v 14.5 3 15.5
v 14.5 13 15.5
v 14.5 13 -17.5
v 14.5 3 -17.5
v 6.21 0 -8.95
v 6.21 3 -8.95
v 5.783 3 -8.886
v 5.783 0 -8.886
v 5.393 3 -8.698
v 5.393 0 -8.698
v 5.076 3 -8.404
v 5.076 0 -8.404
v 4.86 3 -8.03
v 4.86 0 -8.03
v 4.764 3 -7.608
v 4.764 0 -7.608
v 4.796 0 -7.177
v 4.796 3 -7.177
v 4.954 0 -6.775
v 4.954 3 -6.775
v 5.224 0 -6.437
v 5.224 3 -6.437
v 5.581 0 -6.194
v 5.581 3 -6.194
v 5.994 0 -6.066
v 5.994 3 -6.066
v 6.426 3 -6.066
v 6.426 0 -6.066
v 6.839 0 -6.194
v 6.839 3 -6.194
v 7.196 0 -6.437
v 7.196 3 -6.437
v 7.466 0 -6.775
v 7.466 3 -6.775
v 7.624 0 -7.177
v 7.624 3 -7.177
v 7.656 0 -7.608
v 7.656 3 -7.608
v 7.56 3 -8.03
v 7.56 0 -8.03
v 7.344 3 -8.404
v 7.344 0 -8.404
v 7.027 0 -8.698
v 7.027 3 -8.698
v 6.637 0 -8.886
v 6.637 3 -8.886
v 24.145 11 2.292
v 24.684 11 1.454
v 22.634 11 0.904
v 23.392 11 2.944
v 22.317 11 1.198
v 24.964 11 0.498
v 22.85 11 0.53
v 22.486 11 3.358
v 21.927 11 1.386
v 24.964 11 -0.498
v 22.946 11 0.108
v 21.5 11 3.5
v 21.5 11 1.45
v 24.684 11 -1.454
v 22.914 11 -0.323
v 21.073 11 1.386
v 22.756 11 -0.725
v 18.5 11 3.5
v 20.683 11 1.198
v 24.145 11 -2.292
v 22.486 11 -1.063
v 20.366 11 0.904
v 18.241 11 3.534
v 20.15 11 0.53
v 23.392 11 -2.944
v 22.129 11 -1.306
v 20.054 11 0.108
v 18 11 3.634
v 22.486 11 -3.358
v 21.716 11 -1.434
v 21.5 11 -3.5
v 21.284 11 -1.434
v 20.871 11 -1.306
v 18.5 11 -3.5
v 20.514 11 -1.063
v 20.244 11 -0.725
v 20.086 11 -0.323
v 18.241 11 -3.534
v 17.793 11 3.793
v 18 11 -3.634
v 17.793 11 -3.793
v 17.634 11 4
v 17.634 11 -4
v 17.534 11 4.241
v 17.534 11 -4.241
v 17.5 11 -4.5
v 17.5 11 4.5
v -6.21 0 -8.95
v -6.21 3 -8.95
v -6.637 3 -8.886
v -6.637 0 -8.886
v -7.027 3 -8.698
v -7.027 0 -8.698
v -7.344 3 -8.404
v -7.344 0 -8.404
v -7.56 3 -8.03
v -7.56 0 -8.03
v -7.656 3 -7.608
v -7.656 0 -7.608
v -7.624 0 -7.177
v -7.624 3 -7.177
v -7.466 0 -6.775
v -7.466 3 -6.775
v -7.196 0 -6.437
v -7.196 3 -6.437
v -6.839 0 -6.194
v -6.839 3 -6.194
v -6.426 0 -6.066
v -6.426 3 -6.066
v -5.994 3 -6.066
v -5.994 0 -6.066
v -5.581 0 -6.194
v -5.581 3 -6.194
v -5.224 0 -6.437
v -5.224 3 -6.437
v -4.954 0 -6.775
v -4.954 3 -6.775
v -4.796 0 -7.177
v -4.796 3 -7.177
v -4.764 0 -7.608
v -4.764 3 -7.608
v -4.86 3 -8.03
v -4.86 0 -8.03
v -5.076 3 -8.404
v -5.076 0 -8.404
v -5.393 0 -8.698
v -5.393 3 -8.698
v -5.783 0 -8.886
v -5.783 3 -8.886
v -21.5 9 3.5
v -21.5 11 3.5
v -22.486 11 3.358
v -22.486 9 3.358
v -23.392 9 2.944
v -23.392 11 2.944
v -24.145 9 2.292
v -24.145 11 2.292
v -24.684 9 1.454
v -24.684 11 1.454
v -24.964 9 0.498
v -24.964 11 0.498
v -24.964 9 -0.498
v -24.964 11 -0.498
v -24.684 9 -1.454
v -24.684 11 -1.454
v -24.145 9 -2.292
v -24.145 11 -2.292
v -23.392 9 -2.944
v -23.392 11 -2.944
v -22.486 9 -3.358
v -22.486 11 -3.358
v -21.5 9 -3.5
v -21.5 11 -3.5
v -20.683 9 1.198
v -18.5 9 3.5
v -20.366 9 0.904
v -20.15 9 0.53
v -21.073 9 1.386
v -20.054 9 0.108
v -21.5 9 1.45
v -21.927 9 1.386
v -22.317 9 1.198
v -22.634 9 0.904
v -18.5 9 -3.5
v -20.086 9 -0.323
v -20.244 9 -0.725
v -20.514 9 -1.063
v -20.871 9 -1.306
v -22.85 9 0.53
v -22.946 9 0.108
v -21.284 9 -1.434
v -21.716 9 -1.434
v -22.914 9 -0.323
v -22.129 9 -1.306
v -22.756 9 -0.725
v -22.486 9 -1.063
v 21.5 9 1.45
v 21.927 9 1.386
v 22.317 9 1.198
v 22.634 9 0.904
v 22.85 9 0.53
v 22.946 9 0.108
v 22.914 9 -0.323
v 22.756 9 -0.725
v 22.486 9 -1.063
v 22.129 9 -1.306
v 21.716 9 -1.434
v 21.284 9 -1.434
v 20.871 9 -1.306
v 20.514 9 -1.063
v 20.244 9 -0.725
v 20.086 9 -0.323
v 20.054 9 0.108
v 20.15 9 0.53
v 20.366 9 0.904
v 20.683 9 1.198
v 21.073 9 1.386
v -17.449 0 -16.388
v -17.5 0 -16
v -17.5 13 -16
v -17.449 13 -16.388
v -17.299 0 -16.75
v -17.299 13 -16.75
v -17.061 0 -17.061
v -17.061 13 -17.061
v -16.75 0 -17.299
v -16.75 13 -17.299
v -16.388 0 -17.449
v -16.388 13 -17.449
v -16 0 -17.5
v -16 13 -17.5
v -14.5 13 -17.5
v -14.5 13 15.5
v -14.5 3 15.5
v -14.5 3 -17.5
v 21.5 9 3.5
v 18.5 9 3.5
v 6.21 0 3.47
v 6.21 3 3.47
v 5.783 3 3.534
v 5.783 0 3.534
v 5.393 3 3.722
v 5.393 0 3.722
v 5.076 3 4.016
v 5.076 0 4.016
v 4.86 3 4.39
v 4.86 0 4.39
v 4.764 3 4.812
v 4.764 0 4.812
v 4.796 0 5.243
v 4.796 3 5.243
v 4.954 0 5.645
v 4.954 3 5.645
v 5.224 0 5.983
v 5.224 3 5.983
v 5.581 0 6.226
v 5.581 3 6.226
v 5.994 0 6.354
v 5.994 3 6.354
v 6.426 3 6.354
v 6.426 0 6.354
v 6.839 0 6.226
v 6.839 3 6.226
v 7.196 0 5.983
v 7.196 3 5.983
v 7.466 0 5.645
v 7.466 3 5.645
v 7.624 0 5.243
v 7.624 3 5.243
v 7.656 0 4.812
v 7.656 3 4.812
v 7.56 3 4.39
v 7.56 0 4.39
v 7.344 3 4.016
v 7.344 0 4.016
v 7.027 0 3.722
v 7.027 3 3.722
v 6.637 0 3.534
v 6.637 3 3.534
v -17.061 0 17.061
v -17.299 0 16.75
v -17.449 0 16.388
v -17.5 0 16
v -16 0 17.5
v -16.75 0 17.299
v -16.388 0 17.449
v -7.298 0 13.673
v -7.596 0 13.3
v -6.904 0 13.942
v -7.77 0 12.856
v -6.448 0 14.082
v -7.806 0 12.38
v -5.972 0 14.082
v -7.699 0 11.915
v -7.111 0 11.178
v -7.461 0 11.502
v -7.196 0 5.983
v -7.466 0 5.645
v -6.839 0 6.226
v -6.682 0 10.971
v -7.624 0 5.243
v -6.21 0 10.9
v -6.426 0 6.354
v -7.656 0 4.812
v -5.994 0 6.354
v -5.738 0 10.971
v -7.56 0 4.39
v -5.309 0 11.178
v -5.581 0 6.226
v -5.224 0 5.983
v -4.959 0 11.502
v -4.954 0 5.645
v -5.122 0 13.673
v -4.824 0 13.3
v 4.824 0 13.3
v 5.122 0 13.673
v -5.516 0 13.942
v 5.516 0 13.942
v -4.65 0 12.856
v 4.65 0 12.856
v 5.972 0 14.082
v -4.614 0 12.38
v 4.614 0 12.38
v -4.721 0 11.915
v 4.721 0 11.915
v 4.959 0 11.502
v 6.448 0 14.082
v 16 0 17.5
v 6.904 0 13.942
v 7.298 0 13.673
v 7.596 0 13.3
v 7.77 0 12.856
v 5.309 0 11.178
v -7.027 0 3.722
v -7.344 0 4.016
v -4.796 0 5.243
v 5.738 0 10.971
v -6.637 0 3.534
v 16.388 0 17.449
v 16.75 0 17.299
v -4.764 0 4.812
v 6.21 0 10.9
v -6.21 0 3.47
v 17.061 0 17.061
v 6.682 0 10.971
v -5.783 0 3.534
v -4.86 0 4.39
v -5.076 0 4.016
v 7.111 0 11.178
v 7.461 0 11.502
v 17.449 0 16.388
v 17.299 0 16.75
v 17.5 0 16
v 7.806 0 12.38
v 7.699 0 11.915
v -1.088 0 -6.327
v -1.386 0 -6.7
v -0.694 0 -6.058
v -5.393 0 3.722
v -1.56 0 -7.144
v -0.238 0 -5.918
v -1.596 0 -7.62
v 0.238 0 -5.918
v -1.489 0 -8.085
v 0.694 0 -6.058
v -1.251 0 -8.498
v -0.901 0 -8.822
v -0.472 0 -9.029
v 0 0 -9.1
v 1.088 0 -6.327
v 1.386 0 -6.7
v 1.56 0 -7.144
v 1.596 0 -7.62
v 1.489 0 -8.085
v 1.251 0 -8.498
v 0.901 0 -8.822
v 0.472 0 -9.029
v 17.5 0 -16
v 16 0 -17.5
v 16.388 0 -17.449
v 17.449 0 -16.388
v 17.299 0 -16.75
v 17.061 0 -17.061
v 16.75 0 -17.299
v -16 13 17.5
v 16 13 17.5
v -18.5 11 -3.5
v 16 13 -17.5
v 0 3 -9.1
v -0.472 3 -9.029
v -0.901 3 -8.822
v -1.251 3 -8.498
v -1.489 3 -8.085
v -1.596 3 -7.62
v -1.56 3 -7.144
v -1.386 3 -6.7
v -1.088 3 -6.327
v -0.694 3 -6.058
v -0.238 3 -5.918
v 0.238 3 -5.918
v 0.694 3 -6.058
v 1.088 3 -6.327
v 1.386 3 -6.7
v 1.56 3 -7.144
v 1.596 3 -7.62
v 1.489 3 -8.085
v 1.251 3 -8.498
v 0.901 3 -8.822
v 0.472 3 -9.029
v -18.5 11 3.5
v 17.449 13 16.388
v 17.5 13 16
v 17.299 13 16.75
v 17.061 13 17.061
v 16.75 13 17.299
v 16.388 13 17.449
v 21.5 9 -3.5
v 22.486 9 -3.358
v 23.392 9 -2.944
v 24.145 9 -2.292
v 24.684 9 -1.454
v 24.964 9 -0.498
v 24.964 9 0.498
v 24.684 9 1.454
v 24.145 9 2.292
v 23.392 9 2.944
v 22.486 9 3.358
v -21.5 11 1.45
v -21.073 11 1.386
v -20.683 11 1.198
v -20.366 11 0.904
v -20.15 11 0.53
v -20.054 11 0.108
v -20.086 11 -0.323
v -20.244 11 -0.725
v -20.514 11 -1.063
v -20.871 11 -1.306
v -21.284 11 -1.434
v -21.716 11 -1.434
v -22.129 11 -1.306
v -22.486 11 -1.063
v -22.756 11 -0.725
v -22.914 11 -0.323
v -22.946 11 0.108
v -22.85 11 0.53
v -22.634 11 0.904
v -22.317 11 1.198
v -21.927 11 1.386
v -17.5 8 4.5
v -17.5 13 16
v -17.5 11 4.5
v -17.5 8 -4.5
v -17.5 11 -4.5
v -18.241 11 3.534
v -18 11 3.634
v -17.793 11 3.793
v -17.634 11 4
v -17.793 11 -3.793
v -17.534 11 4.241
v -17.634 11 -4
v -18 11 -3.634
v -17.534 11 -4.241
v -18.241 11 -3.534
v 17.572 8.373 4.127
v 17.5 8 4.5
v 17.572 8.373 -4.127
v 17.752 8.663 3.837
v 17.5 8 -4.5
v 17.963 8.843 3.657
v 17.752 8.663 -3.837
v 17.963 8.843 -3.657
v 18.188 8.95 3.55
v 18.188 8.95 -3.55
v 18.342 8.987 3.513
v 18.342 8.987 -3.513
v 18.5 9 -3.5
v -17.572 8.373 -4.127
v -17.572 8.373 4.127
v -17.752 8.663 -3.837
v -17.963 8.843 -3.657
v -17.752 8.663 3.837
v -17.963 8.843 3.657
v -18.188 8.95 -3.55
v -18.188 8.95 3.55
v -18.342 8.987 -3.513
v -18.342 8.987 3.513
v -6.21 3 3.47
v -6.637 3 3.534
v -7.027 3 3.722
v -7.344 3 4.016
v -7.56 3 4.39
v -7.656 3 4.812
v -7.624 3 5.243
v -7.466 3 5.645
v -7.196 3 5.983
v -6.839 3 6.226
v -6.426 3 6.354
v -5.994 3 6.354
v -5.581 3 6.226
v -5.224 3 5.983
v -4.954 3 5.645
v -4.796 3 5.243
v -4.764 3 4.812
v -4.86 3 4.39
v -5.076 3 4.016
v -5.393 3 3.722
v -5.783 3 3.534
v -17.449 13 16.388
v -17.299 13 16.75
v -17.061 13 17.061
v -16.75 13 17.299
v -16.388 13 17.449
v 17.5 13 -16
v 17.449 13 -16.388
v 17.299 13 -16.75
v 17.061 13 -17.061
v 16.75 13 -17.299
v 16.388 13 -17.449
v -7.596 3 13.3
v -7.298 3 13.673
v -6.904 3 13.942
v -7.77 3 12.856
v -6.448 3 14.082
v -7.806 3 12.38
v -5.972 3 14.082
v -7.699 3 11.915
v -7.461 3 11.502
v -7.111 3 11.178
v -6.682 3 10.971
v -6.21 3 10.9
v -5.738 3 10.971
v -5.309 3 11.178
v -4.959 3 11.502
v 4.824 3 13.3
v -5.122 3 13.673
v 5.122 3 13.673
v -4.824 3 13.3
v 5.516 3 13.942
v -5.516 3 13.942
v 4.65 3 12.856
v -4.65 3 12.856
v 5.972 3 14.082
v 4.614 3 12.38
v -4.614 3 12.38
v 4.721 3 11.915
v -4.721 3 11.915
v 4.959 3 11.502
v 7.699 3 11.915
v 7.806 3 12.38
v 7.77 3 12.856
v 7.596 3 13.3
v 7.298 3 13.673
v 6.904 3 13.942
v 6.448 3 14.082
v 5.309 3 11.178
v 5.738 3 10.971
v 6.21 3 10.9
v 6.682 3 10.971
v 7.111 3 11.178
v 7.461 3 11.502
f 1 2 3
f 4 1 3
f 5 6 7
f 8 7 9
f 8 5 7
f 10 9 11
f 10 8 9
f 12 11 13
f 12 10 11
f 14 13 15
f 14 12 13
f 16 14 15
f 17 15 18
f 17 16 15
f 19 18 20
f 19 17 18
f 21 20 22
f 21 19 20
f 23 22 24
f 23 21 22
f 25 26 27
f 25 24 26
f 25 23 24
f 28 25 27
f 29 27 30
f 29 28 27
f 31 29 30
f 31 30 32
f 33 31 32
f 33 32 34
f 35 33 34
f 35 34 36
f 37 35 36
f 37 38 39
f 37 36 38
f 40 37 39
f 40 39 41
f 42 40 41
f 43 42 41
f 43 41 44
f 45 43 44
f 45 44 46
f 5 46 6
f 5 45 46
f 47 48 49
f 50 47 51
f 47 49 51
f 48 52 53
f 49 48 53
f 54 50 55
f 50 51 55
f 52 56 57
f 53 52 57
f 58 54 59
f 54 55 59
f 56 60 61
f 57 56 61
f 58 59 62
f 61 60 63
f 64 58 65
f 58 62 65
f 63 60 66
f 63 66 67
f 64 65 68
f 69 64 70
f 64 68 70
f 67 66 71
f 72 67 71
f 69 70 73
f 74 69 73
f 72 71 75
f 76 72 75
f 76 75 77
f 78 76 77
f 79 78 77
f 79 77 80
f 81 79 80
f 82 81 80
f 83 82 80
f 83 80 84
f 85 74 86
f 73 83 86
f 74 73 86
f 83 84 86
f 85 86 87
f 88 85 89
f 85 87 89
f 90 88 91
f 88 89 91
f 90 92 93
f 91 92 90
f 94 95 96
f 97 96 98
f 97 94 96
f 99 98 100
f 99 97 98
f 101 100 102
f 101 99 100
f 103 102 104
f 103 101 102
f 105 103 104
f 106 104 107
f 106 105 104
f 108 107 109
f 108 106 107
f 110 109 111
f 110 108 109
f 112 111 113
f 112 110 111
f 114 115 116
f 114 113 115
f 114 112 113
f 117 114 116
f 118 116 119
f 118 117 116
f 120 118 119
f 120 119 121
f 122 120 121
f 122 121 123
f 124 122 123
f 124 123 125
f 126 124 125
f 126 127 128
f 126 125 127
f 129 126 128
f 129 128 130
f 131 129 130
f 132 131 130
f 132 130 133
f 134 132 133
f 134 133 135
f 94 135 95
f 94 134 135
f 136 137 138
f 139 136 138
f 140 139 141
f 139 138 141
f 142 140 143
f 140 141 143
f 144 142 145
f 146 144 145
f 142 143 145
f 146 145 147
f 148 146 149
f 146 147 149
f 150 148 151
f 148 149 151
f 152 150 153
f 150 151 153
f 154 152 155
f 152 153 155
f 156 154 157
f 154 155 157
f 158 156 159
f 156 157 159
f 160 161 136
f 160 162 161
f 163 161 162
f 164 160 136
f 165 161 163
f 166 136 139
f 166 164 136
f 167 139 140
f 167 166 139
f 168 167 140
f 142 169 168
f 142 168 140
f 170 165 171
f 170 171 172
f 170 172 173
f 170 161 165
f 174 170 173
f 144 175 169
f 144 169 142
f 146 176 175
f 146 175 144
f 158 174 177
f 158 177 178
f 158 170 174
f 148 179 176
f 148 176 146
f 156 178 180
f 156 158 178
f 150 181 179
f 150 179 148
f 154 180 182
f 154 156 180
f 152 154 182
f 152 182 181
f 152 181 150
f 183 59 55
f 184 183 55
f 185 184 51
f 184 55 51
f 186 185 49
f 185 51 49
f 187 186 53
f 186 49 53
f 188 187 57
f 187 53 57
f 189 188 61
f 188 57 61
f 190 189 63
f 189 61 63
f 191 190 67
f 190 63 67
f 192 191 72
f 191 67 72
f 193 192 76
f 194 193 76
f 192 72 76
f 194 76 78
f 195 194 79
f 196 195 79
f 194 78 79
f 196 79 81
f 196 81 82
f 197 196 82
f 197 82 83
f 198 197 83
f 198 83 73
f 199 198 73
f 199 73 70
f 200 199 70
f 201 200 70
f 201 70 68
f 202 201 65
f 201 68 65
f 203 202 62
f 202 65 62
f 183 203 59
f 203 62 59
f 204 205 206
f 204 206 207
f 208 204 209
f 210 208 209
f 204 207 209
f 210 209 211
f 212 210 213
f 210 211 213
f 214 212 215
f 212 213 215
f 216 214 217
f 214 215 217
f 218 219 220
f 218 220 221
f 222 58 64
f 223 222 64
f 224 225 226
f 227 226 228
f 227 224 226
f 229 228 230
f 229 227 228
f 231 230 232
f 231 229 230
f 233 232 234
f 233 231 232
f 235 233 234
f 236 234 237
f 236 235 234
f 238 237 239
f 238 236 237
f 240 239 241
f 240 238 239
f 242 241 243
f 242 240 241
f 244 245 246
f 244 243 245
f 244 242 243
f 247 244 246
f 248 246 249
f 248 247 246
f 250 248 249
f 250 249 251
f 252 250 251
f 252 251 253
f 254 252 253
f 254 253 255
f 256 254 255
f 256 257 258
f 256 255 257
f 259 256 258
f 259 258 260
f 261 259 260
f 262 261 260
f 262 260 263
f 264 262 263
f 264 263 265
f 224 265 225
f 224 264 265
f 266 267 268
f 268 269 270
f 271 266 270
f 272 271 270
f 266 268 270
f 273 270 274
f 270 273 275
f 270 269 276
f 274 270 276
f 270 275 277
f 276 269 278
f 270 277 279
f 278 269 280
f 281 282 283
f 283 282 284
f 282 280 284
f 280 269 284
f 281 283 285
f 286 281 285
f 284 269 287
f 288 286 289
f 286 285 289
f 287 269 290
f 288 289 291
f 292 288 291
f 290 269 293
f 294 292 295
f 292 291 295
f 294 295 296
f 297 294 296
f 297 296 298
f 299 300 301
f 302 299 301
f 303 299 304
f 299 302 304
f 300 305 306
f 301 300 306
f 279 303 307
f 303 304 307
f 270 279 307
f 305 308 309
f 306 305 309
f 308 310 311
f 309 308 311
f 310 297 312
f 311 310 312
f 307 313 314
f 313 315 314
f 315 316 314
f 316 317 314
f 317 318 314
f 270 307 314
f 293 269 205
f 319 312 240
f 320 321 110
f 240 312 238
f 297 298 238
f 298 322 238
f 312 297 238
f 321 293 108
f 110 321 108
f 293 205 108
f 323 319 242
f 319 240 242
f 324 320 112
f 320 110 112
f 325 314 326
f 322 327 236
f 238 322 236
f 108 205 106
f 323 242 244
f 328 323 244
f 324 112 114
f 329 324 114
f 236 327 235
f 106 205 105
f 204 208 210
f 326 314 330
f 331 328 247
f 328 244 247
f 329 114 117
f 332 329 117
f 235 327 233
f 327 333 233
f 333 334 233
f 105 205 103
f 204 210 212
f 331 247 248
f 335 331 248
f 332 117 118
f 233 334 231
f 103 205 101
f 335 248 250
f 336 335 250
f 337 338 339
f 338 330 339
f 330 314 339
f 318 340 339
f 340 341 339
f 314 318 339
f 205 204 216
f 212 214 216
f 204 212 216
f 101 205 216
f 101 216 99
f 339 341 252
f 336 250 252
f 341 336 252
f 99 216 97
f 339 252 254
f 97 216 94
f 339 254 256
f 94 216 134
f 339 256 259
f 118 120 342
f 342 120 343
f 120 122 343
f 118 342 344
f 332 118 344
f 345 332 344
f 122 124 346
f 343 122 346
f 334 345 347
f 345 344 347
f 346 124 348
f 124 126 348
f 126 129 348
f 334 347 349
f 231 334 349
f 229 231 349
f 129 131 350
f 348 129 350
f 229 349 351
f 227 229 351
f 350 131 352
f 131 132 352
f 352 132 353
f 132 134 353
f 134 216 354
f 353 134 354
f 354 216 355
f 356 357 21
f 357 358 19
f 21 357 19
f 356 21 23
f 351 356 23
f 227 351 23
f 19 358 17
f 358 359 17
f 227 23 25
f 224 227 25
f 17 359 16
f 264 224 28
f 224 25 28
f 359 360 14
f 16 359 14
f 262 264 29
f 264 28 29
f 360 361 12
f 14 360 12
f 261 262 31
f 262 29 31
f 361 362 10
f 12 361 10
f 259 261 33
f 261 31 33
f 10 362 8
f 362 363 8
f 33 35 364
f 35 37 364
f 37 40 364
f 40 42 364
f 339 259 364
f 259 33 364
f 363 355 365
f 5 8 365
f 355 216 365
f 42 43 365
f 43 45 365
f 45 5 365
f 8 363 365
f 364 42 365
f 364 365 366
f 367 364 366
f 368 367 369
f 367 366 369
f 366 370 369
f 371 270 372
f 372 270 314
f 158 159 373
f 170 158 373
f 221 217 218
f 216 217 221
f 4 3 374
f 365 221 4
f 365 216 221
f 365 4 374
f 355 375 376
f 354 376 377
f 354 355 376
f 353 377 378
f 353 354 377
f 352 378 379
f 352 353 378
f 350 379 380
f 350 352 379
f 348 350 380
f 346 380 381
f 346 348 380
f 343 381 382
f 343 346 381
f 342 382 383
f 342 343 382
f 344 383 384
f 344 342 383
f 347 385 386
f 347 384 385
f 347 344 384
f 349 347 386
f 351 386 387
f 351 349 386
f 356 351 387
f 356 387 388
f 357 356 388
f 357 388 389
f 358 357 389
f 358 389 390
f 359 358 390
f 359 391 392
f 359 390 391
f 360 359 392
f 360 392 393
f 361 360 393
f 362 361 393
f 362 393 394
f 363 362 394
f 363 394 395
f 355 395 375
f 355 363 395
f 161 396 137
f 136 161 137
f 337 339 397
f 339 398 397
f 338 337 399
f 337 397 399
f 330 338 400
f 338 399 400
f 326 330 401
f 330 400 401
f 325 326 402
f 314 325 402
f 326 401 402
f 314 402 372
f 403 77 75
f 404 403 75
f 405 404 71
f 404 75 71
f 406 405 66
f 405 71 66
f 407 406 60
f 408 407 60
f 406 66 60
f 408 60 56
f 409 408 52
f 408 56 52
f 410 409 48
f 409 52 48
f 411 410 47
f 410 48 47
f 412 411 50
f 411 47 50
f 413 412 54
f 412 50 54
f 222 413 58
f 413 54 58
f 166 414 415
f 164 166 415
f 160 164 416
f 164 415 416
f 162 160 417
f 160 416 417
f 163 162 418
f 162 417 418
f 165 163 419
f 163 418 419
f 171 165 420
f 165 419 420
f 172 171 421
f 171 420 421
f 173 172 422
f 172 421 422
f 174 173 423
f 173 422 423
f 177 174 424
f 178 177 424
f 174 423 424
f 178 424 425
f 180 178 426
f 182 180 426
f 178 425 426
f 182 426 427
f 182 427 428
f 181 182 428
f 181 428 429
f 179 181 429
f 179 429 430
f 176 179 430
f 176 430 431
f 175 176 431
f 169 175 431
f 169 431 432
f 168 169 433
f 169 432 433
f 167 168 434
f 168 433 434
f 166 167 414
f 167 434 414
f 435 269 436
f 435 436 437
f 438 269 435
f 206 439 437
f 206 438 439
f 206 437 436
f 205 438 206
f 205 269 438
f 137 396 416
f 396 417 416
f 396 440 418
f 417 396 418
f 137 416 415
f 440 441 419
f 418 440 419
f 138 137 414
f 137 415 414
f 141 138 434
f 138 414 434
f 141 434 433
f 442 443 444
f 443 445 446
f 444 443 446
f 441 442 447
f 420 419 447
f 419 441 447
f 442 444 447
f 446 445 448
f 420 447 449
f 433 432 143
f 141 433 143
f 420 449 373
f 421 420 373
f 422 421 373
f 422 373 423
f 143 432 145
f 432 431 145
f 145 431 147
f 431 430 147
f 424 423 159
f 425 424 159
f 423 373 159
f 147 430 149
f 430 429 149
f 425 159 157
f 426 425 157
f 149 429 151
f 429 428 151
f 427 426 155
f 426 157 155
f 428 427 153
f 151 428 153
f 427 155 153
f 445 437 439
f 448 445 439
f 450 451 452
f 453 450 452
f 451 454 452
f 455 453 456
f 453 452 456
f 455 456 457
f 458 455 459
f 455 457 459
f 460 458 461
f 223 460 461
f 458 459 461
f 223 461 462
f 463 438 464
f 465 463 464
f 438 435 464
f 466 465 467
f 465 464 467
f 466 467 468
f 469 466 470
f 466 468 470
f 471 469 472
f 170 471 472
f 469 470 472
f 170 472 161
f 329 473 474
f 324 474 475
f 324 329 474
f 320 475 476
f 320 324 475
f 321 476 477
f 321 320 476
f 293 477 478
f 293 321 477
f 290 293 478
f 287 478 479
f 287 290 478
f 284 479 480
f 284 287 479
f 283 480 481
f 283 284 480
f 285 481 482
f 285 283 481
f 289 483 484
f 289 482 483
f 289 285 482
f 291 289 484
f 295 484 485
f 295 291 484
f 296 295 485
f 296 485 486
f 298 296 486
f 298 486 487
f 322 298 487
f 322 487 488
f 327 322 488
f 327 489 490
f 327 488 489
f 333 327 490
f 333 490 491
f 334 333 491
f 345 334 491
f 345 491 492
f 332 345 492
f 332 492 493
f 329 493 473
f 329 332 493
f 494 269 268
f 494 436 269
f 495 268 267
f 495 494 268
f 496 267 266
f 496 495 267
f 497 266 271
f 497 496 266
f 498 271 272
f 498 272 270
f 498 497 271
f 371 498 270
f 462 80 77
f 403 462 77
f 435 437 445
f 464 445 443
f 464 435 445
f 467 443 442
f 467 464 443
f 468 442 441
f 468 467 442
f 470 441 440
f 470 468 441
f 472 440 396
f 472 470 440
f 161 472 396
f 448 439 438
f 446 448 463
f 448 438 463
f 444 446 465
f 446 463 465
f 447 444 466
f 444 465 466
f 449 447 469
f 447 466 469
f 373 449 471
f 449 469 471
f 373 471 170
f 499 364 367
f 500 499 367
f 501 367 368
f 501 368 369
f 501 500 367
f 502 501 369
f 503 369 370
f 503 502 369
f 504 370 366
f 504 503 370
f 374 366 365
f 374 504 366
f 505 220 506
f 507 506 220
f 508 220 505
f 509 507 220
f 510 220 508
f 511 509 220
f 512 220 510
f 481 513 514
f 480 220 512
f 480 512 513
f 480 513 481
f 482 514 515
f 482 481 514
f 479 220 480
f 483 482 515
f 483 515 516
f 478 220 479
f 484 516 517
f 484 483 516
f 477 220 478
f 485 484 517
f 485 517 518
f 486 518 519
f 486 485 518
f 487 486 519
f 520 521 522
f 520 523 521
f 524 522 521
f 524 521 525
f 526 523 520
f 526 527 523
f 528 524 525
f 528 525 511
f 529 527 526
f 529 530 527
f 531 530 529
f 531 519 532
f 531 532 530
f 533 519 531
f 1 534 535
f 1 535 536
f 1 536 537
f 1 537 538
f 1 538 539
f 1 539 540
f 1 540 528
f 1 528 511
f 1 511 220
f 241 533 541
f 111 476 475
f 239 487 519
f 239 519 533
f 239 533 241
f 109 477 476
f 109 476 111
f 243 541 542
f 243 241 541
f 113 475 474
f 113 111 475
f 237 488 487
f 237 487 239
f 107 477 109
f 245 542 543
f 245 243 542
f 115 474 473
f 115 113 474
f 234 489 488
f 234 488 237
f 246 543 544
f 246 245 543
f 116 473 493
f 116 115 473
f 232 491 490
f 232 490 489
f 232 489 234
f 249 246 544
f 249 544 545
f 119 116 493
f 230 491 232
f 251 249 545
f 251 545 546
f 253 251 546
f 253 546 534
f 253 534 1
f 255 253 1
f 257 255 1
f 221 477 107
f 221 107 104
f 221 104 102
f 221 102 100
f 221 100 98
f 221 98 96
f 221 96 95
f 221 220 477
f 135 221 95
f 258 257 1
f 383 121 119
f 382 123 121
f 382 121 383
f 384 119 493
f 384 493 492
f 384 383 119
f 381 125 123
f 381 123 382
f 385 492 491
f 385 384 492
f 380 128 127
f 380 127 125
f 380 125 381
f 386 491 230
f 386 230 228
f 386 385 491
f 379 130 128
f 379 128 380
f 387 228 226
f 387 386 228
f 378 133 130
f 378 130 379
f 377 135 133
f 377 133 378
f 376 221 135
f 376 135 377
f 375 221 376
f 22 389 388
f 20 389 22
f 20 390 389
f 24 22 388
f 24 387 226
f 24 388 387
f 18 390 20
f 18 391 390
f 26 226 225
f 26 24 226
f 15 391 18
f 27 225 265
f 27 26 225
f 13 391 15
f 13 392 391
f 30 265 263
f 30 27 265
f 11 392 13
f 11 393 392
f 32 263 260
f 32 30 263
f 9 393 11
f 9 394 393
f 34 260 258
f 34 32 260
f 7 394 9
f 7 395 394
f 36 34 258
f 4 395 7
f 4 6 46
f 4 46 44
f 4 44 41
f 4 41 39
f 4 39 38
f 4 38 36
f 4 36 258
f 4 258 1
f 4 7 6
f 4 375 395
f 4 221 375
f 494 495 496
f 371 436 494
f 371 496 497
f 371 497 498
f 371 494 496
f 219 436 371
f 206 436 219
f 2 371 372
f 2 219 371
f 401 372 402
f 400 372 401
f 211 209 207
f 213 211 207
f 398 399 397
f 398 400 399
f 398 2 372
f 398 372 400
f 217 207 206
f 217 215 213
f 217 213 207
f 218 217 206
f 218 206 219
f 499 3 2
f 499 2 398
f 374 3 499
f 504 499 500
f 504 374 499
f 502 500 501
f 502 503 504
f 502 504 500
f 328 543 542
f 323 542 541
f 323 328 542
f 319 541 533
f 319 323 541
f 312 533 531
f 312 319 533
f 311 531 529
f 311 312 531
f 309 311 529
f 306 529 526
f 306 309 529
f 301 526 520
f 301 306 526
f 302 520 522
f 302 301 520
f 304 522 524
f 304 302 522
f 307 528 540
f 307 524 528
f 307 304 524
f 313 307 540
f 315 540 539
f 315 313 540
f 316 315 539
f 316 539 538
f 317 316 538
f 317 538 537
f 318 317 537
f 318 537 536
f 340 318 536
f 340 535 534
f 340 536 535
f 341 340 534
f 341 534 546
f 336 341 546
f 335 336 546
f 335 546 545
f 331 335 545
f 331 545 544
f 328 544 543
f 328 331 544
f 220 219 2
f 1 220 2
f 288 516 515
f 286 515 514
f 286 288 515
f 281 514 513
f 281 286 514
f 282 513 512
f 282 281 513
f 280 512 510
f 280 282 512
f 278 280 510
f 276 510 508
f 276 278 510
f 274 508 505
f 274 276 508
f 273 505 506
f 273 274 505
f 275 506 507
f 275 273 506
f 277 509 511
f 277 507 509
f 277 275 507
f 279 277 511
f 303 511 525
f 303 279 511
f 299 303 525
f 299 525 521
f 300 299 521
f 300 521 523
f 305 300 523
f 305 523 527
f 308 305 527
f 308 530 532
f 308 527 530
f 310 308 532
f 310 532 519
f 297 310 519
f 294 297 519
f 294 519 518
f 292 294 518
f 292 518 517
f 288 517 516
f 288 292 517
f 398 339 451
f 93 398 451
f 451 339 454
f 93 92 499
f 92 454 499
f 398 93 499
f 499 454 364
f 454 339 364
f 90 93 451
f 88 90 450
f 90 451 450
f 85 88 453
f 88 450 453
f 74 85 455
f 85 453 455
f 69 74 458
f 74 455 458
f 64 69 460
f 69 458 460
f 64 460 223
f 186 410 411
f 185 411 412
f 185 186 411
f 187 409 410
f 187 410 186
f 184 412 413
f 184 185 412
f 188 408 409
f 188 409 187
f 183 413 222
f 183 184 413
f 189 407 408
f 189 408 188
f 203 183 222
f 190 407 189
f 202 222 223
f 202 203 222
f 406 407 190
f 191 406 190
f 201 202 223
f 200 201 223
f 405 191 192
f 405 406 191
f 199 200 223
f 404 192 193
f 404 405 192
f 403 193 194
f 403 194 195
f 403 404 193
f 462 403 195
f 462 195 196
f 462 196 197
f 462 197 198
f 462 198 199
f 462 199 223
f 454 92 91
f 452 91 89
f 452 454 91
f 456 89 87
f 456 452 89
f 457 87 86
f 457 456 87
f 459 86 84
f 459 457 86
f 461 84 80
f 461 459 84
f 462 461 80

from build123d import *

# Parameters (mm, degrees)
SKETCH1_W           = 35
SKETCH1_H           = 35
SKETCH1_R           = 1.45
SKETCH1_R_2         = 1.6
BOSS_EXTRUDE1_DEPTH = 13
SHELL1_T            = -3
SKETCH2_W           = 29
SKETCH2_H           = 40.523208079
CUT_EXTRUDE1_DEPTH  = 10
FILLET1_R           = 1.5
SKETCH4_R           = 1.45
BOSS_EXTRUDE3_DEPTH = 2
FILLET2_R           = 1


with BuildPart() as part:
    # Sketch1 → Boss-Extrude1 (new body)
    with BuildSketch(Plane(origin=(0, 0, 0), x_dir=(1, 0, 0), z_dir=(0, 1, 0))):
        Rectangle(SKETCH1_W, SKETCH1_H)
        with Locations(Location((6.21, 7.5, 0), (0, 0, 90))):
            Circle(SKETCH1_R, mode=Mode.SUBTRACT)
        with Locations(Location((0, 7.5, 0), (0, 0, 90))):
            Circle(SKETCH1_R_2, mode=Mode.SUBTRACT)
        with Locations(Location((-6.21, 7.5, 0), (0, 0, 90))):
            Circle(SKETCH1_R, mode=Mode.SUBTRACT)
        with Locations(Location((-6.21, -4.92, 0), (0, 0, 90))):
            Circle(SKETCH1_R, mode=Mode.SUBTRACT)
        with Locations(Location((6.21, -4.92, 0), (0, 0, 90))):
            Circle(SKETCH1_R, mode=Mode.SUBTRACT)
        with Locations(Location((-6.21, -12.5, 0), (0, 0, 90))):
            Circle(SKETCH1_R_2, mode=Mode.SUBTRACT)
        with Locations(Location((6.21, -12.5, 0), (0, 0, 90))):
            Circle(SKETCH1_R_2, mode=Mode.SUBTRACT)
    extrude(amount=BOSS_EXTRUDE1_DEPTH)

    # Shell1
    shell1_openings = [part.faces().sort_by_distance(p)[0] for p in [
        (0, 13, -0.090817289),
    ]]
    offset(amount=SHELL1_T, openings=shell1_openings, kind=Kind.INTERSECTION)

    # Sketch2 → Cut-Extrude1 (cut)
    with BuildSketch(Plane(origin=(0, 13, 0), x_dir=(1, 0, 0), z_dir=(0, 1, 0))):
        with Locations((0, 4.76160404)):
            Rectangle(SKETCH2_W, SKETCH2_H)
    extrude(amount=-CUT_EXTRUDE1_DEPTH, mode=Mode.SUBTRACT)

    # Fillet1
    fillet1_edges = [part.edges().sort_by_distance(p)[0] for p in [
        (-17.5, 6.5, -17.5),
        (17.5, 6.5, -17.5),
        (17.5, 6.5, 17.5),
        (-17.5, 6.5, 17.5),
    ]]
    fillet(fillet1_edges, radius=FILLET1_R)

    # Sketch4 → Boss-Extrude3 (add)
    # profile 1 of 2: a face of its own
    with BuildSketch(Plane(origin=(0, 11, 0), x_dir=(1, 0, 0), z_dir=(0, 1, 0))):
        with BuildLine():
            Line((-17.5, -3.5), (-21.5, -3.5))
            ThreePointArc((-21.5, -3.5), (-25, 0), (-21.5, 3.5))
            Line((-21.5, 3.5), (-17.5, 3.5))
            Line((-17.5, 3.5), (-17.5, -3.5))
        make_face()
        with Locations(Location((-21.5, 0, 0), (0, 0, 270))):
            Circle(SKETCH4_R, mode=Mode.SUBTRACT)
    # profile 2 of 2: a face of its own
    with BuildSketch(Plane(origin=(0, 11, 0), x_dir=(1, 0, 0), z_dir=(0, 1, 0))):
        with BuildLine():
            Line((17.5, 3.5), (21.5, 3.5))
            ThreePointArc((21.5, 3.5), (25, 0), (21.5, -3.5))
            Line((21.5, -3.5), (17.5, -3.5))
            Line((17.5, -3.5), (17.5, 3.5))
        make_face()
        with Locations(Location((21.5, 0, 0), (0, 0, 270))):
            Circle(SKETCH4_R, mode=Mode.SUBTRACT)
    extrude(amount=-BOSS_EXTRUDE3_DEPTH)

    # Fillet2
    fillet2_edges = [part.edges().sort_by_distance(p)[0] for p in [
        (-17.5, 9, 0),
        (-17.5, 10, -3.5),
        (-17.5, 10, 3.5),
        (17.5, 9, 0),
        (17.5, 10, 3.5),
        (17.5, 10, -3.5),
    ]]
    fillet(fillet2_edges, radius=FILLET2_R)


solid = part.part
